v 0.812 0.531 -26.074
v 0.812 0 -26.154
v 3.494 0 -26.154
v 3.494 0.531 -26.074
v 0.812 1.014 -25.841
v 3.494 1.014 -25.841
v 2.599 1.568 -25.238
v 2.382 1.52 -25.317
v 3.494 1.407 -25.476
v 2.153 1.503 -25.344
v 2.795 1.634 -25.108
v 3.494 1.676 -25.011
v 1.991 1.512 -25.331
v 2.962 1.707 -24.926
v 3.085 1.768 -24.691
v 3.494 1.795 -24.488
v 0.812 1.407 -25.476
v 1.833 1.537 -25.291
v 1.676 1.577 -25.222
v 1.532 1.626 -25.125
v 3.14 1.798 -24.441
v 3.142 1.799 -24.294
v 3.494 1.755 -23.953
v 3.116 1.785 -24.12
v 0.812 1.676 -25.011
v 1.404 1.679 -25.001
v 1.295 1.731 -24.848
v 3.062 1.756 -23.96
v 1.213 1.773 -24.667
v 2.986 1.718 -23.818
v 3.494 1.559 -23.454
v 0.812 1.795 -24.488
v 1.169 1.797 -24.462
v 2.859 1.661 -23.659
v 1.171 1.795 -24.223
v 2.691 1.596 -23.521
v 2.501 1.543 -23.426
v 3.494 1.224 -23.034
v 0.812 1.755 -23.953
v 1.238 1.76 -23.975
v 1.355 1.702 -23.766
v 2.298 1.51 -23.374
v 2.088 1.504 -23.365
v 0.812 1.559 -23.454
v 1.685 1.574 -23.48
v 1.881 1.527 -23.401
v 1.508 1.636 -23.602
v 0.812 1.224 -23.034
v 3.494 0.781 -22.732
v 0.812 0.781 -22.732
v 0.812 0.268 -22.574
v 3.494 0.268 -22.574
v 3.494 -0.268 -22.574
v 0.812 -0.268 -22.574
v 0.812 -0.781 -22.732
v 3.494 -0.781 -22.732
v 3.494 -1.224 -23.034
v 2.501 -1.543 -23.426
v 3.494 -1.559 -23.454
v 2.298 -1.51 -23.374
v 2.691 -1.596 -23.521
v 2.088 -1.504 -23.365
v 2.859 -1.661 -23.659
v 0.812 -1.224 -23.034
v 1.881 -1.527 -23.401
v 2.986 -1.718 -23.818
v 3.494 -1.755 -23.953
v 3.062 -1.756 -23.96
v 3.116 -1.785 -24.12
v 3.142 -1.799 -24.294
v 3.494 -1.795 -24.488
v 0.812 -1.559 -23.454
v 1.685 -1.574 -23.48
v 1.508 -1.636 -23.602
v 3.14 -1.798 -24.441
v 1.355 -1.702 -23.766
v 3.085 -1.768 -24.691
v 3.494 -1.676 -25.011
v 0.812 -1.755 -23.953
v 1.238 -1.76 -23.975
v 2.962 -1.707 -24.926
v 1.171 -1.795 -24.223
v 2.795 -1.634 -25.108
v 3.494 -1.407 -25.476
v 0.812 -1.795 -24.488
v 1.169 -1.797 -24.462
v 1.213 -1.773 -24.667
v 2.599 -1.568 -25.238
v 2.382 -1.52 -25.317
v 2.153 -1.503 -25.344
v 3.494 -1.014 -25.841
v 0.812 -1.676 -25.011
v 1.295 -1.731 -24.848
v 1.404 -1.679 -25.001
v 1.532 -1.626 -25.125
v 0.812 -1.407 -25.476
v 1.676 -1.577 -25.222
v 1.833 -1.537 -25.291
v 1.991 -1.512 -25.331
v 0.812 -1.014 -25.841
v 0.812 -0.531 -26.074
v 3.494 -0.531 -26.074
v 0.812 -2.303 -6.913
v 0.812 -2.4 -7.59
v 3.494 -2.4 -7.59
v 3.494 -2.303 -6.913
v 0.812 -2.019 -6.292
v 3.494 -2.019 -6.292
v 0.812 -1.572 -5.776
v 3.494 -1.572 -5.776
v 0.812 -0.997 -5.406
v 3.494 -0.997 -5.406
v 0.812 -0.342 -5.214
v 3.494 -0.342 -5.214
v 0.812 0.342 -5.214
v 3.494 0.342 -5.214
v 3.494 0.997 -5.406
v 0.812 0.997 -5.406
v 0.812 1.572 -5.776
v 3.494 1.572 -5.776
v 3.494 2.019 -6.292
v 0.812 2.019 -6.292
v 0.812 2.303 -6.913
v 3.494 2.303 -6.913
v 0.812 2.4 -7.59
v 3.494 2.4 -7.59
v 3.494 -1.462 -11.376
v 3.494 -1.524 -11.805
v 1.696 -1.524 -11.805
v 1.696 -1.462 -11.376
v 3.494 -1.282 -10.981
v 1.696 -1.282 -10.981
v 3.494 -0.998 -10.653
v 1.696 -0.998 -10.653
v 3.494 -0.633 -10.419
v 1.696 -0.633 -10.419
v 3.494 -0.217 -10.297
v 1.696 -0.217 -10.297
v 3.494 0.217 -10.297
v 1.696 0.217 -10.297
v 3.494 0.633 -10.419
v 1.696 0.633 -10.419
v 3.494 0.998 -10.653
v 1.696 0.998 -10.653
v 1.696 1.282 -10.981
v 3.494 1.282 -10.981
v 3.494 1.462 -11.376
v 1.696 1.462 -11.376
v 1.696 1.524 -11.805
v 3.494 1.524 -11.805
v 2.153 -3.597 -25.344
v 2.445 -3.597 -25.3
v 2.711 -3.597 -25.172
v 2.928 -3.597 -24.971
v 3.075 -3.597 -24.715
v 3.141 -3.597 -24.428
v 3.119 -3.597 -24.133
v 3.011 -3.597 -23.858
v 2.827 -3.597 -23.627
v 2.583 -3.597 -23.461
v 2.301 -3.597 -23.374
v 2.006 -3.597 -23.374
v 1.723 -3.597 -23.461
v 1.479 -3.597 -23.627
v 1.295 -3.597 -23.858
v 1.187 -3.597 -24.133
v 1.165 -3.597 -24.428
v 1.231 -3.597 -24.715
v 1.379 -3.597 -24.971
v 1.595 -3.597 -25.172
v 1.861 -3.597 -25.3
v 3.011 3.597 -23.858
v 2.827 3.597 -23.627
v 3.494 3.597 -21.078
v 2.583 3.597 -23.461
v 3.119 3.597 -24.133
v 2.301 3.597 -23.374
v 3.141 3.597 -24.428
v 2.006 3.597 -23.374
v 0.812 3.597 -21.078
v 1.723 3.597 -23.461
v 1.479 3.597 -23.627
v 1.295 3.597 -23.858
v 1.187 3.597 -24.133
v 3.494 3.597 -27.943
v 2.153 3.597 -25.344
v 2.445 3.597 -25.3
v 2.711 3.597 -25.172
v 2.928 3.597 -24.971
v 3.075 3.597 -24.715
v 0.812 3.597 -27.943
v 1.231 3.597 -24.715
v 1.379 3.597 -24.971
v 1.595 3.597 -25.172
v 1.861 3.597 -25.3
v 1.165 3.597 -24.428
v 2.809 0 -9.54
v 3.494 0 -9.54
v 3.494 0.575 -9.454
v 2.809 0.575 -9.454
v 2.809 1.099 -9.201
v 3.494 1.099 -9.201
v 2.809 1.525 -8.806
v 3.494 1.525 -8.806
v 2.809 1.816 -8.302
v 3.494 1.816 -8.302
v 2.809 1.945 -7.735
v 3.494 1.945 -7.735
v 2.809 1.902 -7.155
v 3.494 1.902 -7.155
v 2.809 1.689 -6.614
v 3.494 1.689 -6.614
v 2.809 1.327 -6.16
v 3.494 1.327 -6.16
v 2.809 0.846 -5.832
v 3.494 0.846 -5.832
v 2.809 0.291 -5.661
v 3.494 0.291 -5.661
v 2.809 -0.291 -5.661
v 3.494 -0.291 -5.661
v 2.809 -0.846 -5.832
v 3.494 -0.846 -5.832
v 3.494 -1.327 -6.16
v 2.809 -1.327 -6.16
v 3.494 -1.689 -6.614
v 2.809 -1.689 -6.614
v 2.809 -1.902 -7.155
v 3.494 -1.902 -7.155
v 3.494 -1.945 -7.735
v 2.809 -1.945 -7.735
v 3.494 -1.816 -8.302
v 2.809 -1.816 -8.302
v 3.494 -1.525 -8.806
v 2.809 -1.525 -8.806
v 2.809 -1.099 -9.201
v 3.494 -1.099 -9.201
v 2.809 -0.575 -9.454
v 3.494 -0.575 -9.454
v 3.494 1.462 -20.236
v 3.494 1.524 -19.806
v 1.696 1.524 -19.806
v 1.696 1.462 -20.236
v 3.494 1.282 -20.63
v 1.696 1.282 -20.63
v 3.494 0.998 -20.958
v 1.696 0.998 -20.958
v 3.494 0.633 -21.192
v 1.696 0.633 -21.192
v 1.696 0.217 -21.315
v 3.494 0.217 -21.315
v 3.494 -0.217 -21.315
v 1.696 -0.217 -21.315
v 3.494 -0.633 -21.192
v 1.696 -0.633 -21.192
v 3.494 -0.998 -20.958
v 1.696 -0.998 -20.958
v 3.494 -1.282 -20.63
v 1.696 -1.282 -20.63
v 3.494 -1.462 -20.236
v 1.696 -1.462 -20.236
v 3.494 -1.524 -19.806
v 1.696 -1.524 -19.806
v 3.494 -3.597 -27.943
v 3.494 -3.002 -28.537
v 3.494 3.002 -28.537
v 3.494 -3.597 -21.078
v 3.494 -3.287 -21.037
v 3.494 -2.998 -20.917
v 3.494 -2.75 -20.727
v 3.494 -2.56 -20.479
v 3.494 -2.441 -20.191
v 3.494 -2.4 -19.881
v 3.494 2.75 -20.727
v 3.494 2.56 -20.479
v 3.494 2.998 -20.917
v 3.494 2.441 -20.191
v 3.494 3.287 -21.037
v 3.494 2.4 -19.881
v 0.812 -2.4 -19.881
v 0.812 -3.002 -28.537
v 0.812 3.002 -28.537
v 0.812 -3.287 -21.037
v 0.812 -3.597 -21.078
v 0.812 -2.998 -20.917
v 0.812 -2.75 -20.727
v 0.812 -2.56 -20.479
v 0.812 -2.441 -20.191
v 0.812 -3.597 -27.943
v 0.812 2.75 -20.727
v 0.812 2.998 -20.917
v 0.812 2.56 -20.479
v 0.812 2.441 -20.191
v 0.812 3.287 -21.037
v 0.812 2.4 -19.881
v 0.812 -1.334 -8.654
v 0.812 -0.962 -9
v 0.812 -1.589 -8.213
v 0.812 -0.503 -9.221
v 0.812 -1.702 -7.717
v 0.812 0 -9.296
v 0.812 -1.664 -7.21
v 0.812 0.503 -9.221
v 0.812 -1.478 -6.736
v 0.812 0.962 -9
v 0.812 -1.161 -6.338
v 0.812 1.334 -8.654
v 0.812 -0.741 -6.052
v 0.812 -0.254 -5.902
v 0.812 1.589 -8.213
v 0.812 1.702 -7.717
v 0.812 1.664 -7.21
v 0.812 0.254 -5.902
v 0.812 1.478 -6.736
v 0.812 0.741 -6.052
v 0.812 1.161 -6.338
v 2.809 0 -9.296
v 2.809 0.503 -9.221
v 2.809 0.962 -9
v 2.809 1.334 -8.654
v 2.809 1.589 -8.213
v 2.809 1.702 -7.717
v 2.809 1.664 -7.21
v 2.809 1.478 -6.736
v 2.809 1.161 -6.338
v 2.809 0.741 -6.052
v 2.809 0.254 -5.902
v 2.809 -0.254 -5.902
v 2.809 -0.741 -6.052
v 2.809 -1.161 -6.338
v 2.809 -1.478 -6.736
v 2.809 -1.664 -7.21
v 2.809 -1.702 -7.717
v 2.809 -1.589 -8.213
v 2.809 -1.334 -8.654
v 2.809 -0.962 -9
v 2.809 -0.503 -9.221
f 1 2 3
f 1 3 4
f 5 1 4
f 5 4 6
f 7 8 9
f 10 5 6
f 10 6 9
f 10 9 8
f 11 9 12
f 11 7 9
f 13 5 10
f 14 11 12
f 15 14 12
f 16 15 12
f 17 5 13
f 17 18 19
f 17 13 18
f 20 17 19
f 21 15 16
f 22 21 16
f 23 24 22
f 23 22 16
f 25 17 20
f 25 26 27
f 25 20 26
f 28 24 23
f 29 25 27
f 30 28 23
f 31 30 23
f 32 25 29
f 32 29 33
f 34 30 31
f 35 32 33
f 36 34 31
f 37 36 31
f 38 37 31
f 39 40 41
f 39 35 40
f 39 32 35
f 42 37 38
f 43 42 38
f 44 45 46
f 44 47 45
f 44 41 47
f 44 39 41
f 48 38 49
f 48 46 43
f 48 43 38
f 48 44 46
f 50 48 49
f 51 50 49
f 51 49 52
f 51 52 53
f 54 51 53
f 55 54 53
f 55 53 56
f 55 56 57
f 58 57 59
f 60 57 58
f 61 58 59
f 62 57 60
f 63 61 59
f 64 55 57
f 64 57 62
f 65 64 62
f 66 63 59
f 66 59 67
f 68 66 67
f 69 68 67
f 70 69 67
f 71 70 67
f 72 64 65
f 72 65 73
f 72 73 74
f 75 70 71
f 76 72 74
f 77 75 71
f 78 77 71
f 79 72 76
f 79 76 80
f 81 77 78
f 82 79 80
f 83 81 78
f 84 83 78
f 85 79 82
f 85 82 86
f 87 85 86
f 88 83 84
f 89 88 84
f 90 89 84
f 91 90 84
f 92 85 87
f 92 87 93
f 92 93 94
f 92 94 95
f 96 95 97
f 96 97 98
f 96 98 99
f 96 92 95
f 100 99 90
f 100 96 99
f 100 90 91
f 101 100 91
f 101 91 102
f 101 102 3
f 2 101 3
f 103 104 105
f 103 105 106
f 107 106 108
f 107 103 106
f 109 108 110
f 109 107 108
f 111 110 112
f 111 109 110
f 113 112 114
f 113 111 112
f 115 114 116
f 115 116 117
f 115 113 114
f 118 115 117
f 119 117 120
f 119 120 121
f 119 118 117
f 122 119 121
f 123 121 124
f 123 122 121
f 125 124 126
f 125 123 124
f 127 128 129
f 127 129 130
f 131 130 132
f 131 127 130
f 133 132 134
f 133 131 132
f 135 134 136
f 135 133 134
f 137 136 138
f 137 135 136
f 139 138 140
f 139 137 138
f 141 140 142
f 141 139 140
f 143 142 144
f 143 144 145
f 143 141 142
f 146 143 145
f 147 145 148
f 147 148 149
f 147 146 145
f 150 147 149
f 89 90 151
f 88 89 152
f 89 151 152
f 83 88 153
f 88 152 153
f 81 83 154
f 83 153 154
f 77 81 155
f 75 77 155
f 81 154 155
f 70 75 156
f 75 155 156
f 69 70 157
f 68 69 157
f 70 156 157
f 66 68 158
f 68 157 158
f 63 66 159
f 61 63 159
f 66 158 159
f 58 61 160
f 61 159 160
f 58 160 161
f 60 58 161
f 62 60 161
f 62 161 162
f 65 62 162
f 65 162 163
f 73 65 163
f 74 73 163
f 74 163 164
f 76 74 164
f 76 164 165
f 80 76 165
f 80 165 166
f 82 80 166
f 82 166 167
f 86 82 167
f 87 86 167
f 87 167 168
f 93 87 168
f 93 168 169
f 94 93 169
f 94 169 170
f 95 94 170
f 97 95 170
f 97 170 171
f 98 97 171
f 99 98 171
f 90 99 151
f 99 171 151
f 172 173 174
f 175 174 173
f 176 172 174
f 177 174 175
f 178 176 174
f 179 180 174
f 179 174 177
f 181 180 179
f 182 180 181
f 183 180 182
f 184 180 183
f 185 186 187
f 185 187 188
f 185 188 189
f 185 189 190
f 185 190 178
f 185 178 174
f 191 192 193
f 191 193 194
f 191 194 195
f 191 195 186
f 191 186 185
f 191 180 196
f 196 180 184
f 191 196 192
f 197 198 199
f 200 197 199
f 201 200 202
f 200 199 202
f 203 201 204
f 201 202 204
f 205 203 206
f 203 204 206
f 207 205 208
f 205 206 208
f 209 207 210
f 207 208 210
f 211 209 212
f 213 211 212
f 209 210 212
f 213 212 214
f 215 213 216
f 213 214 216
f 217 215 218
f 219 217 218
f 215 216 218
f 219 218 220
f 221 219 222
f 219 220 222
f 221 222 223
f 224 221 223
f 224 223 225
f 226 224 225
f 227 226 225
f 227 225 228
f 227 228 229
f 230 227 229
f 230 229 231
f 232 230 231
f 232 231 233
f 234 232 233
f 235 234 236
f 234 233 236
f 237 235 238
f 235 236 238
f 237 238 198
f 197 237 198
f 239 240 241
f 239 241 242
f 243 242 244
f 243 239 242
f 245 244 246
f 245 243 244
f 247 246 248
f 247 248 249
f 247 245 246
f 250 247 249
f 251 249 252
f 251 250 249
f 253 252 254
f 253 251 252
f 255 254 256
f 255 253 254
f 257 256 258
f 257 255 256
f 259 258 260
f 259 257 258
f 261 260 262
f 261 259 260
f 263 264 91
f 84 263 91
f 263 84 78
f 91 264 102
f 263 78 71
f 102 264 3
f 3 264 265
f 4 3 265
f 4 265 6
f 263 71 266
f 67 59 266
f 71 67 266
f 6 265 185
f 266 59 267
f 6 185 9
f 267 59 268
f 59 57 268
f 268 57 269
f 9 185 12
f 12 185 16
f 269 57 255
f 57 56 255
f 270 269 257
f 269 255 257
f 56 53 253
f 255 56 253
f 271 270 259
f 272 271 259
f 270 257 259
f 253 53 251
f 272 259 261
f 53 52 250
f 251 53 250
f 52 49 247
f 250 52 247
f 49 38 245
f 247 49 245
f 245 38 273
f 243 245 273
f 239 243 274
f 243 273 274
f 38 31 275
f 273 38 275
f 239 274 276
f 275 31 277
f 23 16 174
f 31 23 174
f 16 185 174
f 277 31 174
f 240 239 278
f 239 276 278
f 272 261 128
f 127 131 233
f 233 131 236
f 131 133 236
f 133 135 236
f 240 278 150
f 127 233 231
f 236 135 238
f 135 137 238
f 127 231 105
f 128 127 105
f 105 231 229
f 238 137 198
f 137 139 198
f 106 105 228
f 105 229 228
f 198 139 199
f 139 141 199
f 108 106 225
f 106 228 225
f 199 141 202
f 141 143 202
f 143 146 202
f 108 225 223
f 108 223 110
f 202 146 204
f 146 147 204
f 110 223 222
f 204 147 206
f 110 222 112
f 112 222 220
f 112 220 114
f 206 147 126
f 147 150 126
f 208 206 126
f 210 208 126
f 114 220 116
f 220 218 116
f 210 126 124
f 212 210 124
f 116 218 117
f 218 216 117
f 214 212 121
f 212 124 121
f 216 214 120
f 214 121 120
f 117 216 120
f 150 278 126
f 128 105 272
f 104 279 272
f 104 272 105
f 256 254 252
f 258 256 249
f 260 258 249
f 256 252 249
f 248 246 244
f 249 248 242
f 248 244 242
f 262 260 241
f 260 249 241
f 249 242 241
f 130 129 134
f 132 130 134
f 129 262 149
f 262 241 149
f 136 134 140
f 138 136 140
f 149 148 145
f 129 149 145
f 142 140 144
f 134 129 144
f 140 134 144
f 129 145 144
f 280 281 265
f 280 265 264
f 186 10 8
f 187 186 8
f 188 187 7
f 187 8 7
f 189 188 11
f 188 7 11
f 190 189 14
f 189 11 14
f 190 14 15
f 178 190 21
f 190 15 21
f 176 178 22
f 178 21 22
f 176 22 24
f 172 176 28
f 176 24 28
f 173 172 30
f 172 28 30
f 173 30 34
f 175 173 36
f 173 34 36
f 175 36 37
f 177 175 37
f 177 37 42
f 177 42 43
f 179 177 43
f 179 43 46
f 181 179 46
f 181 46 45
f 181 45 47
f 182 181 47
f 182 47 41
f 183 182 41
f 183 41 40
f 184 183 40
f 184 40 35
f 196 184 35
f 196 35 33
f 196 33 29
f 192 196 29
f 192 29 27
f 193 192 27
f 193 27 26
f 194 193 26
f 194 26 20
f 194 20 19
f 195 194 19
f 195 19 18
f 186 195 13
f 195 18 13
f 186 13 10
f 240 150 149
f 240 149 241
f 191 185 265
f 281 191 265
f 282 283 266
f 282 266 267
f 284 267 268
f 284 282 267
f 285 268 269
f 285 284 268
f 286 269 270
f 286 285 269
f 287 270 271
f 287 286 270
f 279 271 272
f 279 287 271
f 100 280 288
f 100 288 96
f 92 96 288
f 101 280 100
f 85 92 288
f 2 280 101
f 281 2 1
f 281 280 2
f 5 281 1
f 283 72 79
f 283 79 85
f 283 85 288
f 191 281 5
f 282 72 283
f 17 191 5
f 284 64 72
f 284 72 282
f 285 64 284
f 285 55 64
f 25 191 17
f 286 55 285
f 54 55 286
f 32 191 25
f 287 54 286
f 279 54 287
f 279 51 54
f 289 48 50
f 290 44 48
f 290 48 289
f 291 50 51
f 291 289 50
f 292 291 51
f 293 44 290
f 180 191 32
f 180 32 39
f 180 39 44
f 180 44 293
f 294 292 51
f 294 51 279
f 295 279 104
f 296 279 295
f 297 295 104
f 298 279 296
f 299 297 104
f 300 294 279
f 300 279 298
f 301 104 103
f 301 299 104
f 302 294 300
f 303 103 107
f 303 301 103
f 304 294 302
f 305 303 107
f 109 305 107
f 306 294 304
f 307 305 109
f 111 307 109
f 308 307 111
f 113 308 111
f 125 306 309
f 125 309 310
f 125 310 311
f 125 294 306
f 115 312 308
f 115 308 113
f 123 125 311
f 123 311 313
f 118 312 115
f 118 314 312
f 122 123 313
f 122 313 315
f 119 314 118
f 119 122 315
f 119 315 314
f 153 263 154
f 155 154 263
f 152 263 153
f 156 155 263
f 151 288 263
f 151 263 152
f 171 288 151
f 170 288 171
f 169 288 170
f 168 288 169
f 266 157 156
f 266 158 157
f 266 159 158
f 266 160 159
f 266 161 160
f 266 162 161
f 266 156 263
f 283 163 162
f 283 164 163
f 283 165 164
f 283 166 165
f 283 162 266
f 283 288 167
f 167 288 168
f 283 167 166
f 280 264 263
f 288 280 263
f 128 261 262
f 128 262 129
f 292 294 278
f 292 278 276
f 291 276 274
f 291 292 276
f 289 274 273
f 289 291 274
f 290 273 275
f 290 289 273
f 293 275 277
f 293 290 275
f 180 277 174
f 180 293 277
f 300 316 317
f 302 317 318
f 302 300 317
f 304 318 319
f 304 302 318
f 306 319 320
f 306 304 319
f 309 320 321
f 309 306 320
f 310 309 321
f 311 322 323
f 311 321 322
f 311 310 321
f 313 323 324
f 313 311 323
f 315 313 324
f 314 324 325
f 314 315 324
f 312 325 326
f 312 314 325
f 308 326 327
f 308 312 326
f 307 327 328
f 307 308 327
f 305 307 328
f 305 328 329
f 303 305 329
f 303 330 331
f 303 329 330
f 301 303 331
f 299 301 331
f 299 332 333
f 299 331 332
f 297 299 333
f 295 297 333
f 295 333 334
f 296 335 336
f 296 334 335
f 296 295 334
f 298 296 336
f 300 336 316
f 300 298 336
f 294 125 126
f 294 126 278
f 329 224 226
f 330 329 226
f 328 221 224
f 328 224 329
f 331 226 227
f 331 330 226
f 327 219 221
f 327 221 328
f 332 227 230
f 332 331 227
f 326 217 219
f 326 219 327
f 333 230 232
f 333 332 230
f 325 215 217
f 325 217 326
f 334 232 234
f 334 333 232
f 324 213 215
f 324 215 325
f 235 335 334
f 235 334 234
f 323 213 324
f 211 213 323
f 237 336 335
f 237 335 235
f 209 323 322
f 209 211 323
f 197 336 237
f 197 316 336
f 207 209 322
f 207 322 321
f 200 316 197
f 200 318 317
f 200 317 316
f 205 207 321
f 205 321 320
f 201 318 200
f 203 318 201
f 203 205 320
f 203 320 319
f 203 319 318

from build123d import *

# Parameters (mm, degrees)
SKETCH1_R           = 2.8448
SKETCH1_R_2         = 2.999999969
BOSS_EXTRUDE1_DEPTH = 4.4704
SKETCH2_R           = 3.2512
CUT_EXTRUDE1_DEPTH  = 1.143
CUT_EXTRUDE2_DEPTH  = 2.9972
SKETCH5_R           = 1.651
CUT_EXTRUDE3_DEPTH  = 38.18359042
SCALE1_SCALE        = 0.6


with BuildPart() as part:
    # Sketch1 → Boss-Extrude1 (new body)
    with BuildSketch(Plane(origin=(0, 0, 0), x_dir=(0, 0, -1), z_dir=(1, 0, 0))):
        with BuildLine():
            Line((0, 4.000000128), (20.485599872, 4.000000128))
            ThreePointArc((20.485599872, 4.000000128), (21.895853546, 4.584146326), (22.479999744, 5.9944))
            Line((22.479999744, 5.9944), (33.922199872, 5.9944))
            Line((33.922199872, 5.9944), (34.912799872, 5.0038))
            Line((34.912799872, 5.0038), (34.912799872, -5.0038))
            Line((34.912799872, -5.0038), (33.922199872, -5.9944))
            Line((33.922199872, -5.9944), (22.479999744, -5.9944))
            ThreePointArc((22.479999744, -5.9944), (21.895853546, -4.584146326), (20.485599872, -4.000000128))
            Line((20.485599872, -4.000000128), (0, -4.000000128))
            ThreePointArc((0, -4.000000128), (-4.000000128, 0), (0, 4.000000128))
        make_face()
        Circle(SKETCH1_R, mode=Mode.SUBTRACT)
        with Locations((27.94, 0)):
            Circle(SKETCH1_R_2, mode=Mode.SUBTRACT)
    extrude(amount=BOSS_EXTRUDE1_DEPTH)

    # Sketch2 → Cut-Extrude1 (cut)
    with BuildSketch(Plane(origin=(4.4704, 0, 0), x_dir=(0, 0, -1), z_dir=(1, 0, 0))):
        Circle(SKETCH2_R)
    extrude(amount=-CUT_EXTRUDE1_DEPTH, mode=Mode.SUBTRACT)

    # Sketch4 → Cut-Extrude2 (cut)
    with BuildSketch(Plane(origin=(4.4704, 0, 0), x_dir=(0, 0, -1), z_dir=(1, 0, 0))):
        with BuildLine():
            Line((7.0259921, 2.54), (20.3609921, 2.54))
            ThreePointArc((20.3609921, 2.54), (22.9009921, 0), (20.3609921, -2.54))
            Line((20.3609921, -2.54), (7.0259921, -2.54))
            ThreePointArc((7.0259921, -2.54), (4.4859921, 0), (7.0259921, 2.54))
        make_face()
    extrude(amount=-CUT_EXTRUDE2_DEPTH, mode=Mode.SUBTRACT)

    # Sketch5 → Cut-Extrude3 (cut, through all)
    with BuildSketch(Plane.XZ.offset(5.9944)):
        with Locations(Location((2.2352, -27.94, 0), (0, 0, 270))):
            Circle(SKETCH5_R)
    extrude(amount=-CUT_EXTRUDE3_DEPTH, mode=Mode.SUBTRACT)


with BuildPart() as part_1:
    # Scale1: scaled about (2.030165897, 0, -18.973898941)
    add(part.part.scale(SCALE1_SCALE).moved(Location((0.812066359, 0, -7.589559576))))


solid = part_1.part
